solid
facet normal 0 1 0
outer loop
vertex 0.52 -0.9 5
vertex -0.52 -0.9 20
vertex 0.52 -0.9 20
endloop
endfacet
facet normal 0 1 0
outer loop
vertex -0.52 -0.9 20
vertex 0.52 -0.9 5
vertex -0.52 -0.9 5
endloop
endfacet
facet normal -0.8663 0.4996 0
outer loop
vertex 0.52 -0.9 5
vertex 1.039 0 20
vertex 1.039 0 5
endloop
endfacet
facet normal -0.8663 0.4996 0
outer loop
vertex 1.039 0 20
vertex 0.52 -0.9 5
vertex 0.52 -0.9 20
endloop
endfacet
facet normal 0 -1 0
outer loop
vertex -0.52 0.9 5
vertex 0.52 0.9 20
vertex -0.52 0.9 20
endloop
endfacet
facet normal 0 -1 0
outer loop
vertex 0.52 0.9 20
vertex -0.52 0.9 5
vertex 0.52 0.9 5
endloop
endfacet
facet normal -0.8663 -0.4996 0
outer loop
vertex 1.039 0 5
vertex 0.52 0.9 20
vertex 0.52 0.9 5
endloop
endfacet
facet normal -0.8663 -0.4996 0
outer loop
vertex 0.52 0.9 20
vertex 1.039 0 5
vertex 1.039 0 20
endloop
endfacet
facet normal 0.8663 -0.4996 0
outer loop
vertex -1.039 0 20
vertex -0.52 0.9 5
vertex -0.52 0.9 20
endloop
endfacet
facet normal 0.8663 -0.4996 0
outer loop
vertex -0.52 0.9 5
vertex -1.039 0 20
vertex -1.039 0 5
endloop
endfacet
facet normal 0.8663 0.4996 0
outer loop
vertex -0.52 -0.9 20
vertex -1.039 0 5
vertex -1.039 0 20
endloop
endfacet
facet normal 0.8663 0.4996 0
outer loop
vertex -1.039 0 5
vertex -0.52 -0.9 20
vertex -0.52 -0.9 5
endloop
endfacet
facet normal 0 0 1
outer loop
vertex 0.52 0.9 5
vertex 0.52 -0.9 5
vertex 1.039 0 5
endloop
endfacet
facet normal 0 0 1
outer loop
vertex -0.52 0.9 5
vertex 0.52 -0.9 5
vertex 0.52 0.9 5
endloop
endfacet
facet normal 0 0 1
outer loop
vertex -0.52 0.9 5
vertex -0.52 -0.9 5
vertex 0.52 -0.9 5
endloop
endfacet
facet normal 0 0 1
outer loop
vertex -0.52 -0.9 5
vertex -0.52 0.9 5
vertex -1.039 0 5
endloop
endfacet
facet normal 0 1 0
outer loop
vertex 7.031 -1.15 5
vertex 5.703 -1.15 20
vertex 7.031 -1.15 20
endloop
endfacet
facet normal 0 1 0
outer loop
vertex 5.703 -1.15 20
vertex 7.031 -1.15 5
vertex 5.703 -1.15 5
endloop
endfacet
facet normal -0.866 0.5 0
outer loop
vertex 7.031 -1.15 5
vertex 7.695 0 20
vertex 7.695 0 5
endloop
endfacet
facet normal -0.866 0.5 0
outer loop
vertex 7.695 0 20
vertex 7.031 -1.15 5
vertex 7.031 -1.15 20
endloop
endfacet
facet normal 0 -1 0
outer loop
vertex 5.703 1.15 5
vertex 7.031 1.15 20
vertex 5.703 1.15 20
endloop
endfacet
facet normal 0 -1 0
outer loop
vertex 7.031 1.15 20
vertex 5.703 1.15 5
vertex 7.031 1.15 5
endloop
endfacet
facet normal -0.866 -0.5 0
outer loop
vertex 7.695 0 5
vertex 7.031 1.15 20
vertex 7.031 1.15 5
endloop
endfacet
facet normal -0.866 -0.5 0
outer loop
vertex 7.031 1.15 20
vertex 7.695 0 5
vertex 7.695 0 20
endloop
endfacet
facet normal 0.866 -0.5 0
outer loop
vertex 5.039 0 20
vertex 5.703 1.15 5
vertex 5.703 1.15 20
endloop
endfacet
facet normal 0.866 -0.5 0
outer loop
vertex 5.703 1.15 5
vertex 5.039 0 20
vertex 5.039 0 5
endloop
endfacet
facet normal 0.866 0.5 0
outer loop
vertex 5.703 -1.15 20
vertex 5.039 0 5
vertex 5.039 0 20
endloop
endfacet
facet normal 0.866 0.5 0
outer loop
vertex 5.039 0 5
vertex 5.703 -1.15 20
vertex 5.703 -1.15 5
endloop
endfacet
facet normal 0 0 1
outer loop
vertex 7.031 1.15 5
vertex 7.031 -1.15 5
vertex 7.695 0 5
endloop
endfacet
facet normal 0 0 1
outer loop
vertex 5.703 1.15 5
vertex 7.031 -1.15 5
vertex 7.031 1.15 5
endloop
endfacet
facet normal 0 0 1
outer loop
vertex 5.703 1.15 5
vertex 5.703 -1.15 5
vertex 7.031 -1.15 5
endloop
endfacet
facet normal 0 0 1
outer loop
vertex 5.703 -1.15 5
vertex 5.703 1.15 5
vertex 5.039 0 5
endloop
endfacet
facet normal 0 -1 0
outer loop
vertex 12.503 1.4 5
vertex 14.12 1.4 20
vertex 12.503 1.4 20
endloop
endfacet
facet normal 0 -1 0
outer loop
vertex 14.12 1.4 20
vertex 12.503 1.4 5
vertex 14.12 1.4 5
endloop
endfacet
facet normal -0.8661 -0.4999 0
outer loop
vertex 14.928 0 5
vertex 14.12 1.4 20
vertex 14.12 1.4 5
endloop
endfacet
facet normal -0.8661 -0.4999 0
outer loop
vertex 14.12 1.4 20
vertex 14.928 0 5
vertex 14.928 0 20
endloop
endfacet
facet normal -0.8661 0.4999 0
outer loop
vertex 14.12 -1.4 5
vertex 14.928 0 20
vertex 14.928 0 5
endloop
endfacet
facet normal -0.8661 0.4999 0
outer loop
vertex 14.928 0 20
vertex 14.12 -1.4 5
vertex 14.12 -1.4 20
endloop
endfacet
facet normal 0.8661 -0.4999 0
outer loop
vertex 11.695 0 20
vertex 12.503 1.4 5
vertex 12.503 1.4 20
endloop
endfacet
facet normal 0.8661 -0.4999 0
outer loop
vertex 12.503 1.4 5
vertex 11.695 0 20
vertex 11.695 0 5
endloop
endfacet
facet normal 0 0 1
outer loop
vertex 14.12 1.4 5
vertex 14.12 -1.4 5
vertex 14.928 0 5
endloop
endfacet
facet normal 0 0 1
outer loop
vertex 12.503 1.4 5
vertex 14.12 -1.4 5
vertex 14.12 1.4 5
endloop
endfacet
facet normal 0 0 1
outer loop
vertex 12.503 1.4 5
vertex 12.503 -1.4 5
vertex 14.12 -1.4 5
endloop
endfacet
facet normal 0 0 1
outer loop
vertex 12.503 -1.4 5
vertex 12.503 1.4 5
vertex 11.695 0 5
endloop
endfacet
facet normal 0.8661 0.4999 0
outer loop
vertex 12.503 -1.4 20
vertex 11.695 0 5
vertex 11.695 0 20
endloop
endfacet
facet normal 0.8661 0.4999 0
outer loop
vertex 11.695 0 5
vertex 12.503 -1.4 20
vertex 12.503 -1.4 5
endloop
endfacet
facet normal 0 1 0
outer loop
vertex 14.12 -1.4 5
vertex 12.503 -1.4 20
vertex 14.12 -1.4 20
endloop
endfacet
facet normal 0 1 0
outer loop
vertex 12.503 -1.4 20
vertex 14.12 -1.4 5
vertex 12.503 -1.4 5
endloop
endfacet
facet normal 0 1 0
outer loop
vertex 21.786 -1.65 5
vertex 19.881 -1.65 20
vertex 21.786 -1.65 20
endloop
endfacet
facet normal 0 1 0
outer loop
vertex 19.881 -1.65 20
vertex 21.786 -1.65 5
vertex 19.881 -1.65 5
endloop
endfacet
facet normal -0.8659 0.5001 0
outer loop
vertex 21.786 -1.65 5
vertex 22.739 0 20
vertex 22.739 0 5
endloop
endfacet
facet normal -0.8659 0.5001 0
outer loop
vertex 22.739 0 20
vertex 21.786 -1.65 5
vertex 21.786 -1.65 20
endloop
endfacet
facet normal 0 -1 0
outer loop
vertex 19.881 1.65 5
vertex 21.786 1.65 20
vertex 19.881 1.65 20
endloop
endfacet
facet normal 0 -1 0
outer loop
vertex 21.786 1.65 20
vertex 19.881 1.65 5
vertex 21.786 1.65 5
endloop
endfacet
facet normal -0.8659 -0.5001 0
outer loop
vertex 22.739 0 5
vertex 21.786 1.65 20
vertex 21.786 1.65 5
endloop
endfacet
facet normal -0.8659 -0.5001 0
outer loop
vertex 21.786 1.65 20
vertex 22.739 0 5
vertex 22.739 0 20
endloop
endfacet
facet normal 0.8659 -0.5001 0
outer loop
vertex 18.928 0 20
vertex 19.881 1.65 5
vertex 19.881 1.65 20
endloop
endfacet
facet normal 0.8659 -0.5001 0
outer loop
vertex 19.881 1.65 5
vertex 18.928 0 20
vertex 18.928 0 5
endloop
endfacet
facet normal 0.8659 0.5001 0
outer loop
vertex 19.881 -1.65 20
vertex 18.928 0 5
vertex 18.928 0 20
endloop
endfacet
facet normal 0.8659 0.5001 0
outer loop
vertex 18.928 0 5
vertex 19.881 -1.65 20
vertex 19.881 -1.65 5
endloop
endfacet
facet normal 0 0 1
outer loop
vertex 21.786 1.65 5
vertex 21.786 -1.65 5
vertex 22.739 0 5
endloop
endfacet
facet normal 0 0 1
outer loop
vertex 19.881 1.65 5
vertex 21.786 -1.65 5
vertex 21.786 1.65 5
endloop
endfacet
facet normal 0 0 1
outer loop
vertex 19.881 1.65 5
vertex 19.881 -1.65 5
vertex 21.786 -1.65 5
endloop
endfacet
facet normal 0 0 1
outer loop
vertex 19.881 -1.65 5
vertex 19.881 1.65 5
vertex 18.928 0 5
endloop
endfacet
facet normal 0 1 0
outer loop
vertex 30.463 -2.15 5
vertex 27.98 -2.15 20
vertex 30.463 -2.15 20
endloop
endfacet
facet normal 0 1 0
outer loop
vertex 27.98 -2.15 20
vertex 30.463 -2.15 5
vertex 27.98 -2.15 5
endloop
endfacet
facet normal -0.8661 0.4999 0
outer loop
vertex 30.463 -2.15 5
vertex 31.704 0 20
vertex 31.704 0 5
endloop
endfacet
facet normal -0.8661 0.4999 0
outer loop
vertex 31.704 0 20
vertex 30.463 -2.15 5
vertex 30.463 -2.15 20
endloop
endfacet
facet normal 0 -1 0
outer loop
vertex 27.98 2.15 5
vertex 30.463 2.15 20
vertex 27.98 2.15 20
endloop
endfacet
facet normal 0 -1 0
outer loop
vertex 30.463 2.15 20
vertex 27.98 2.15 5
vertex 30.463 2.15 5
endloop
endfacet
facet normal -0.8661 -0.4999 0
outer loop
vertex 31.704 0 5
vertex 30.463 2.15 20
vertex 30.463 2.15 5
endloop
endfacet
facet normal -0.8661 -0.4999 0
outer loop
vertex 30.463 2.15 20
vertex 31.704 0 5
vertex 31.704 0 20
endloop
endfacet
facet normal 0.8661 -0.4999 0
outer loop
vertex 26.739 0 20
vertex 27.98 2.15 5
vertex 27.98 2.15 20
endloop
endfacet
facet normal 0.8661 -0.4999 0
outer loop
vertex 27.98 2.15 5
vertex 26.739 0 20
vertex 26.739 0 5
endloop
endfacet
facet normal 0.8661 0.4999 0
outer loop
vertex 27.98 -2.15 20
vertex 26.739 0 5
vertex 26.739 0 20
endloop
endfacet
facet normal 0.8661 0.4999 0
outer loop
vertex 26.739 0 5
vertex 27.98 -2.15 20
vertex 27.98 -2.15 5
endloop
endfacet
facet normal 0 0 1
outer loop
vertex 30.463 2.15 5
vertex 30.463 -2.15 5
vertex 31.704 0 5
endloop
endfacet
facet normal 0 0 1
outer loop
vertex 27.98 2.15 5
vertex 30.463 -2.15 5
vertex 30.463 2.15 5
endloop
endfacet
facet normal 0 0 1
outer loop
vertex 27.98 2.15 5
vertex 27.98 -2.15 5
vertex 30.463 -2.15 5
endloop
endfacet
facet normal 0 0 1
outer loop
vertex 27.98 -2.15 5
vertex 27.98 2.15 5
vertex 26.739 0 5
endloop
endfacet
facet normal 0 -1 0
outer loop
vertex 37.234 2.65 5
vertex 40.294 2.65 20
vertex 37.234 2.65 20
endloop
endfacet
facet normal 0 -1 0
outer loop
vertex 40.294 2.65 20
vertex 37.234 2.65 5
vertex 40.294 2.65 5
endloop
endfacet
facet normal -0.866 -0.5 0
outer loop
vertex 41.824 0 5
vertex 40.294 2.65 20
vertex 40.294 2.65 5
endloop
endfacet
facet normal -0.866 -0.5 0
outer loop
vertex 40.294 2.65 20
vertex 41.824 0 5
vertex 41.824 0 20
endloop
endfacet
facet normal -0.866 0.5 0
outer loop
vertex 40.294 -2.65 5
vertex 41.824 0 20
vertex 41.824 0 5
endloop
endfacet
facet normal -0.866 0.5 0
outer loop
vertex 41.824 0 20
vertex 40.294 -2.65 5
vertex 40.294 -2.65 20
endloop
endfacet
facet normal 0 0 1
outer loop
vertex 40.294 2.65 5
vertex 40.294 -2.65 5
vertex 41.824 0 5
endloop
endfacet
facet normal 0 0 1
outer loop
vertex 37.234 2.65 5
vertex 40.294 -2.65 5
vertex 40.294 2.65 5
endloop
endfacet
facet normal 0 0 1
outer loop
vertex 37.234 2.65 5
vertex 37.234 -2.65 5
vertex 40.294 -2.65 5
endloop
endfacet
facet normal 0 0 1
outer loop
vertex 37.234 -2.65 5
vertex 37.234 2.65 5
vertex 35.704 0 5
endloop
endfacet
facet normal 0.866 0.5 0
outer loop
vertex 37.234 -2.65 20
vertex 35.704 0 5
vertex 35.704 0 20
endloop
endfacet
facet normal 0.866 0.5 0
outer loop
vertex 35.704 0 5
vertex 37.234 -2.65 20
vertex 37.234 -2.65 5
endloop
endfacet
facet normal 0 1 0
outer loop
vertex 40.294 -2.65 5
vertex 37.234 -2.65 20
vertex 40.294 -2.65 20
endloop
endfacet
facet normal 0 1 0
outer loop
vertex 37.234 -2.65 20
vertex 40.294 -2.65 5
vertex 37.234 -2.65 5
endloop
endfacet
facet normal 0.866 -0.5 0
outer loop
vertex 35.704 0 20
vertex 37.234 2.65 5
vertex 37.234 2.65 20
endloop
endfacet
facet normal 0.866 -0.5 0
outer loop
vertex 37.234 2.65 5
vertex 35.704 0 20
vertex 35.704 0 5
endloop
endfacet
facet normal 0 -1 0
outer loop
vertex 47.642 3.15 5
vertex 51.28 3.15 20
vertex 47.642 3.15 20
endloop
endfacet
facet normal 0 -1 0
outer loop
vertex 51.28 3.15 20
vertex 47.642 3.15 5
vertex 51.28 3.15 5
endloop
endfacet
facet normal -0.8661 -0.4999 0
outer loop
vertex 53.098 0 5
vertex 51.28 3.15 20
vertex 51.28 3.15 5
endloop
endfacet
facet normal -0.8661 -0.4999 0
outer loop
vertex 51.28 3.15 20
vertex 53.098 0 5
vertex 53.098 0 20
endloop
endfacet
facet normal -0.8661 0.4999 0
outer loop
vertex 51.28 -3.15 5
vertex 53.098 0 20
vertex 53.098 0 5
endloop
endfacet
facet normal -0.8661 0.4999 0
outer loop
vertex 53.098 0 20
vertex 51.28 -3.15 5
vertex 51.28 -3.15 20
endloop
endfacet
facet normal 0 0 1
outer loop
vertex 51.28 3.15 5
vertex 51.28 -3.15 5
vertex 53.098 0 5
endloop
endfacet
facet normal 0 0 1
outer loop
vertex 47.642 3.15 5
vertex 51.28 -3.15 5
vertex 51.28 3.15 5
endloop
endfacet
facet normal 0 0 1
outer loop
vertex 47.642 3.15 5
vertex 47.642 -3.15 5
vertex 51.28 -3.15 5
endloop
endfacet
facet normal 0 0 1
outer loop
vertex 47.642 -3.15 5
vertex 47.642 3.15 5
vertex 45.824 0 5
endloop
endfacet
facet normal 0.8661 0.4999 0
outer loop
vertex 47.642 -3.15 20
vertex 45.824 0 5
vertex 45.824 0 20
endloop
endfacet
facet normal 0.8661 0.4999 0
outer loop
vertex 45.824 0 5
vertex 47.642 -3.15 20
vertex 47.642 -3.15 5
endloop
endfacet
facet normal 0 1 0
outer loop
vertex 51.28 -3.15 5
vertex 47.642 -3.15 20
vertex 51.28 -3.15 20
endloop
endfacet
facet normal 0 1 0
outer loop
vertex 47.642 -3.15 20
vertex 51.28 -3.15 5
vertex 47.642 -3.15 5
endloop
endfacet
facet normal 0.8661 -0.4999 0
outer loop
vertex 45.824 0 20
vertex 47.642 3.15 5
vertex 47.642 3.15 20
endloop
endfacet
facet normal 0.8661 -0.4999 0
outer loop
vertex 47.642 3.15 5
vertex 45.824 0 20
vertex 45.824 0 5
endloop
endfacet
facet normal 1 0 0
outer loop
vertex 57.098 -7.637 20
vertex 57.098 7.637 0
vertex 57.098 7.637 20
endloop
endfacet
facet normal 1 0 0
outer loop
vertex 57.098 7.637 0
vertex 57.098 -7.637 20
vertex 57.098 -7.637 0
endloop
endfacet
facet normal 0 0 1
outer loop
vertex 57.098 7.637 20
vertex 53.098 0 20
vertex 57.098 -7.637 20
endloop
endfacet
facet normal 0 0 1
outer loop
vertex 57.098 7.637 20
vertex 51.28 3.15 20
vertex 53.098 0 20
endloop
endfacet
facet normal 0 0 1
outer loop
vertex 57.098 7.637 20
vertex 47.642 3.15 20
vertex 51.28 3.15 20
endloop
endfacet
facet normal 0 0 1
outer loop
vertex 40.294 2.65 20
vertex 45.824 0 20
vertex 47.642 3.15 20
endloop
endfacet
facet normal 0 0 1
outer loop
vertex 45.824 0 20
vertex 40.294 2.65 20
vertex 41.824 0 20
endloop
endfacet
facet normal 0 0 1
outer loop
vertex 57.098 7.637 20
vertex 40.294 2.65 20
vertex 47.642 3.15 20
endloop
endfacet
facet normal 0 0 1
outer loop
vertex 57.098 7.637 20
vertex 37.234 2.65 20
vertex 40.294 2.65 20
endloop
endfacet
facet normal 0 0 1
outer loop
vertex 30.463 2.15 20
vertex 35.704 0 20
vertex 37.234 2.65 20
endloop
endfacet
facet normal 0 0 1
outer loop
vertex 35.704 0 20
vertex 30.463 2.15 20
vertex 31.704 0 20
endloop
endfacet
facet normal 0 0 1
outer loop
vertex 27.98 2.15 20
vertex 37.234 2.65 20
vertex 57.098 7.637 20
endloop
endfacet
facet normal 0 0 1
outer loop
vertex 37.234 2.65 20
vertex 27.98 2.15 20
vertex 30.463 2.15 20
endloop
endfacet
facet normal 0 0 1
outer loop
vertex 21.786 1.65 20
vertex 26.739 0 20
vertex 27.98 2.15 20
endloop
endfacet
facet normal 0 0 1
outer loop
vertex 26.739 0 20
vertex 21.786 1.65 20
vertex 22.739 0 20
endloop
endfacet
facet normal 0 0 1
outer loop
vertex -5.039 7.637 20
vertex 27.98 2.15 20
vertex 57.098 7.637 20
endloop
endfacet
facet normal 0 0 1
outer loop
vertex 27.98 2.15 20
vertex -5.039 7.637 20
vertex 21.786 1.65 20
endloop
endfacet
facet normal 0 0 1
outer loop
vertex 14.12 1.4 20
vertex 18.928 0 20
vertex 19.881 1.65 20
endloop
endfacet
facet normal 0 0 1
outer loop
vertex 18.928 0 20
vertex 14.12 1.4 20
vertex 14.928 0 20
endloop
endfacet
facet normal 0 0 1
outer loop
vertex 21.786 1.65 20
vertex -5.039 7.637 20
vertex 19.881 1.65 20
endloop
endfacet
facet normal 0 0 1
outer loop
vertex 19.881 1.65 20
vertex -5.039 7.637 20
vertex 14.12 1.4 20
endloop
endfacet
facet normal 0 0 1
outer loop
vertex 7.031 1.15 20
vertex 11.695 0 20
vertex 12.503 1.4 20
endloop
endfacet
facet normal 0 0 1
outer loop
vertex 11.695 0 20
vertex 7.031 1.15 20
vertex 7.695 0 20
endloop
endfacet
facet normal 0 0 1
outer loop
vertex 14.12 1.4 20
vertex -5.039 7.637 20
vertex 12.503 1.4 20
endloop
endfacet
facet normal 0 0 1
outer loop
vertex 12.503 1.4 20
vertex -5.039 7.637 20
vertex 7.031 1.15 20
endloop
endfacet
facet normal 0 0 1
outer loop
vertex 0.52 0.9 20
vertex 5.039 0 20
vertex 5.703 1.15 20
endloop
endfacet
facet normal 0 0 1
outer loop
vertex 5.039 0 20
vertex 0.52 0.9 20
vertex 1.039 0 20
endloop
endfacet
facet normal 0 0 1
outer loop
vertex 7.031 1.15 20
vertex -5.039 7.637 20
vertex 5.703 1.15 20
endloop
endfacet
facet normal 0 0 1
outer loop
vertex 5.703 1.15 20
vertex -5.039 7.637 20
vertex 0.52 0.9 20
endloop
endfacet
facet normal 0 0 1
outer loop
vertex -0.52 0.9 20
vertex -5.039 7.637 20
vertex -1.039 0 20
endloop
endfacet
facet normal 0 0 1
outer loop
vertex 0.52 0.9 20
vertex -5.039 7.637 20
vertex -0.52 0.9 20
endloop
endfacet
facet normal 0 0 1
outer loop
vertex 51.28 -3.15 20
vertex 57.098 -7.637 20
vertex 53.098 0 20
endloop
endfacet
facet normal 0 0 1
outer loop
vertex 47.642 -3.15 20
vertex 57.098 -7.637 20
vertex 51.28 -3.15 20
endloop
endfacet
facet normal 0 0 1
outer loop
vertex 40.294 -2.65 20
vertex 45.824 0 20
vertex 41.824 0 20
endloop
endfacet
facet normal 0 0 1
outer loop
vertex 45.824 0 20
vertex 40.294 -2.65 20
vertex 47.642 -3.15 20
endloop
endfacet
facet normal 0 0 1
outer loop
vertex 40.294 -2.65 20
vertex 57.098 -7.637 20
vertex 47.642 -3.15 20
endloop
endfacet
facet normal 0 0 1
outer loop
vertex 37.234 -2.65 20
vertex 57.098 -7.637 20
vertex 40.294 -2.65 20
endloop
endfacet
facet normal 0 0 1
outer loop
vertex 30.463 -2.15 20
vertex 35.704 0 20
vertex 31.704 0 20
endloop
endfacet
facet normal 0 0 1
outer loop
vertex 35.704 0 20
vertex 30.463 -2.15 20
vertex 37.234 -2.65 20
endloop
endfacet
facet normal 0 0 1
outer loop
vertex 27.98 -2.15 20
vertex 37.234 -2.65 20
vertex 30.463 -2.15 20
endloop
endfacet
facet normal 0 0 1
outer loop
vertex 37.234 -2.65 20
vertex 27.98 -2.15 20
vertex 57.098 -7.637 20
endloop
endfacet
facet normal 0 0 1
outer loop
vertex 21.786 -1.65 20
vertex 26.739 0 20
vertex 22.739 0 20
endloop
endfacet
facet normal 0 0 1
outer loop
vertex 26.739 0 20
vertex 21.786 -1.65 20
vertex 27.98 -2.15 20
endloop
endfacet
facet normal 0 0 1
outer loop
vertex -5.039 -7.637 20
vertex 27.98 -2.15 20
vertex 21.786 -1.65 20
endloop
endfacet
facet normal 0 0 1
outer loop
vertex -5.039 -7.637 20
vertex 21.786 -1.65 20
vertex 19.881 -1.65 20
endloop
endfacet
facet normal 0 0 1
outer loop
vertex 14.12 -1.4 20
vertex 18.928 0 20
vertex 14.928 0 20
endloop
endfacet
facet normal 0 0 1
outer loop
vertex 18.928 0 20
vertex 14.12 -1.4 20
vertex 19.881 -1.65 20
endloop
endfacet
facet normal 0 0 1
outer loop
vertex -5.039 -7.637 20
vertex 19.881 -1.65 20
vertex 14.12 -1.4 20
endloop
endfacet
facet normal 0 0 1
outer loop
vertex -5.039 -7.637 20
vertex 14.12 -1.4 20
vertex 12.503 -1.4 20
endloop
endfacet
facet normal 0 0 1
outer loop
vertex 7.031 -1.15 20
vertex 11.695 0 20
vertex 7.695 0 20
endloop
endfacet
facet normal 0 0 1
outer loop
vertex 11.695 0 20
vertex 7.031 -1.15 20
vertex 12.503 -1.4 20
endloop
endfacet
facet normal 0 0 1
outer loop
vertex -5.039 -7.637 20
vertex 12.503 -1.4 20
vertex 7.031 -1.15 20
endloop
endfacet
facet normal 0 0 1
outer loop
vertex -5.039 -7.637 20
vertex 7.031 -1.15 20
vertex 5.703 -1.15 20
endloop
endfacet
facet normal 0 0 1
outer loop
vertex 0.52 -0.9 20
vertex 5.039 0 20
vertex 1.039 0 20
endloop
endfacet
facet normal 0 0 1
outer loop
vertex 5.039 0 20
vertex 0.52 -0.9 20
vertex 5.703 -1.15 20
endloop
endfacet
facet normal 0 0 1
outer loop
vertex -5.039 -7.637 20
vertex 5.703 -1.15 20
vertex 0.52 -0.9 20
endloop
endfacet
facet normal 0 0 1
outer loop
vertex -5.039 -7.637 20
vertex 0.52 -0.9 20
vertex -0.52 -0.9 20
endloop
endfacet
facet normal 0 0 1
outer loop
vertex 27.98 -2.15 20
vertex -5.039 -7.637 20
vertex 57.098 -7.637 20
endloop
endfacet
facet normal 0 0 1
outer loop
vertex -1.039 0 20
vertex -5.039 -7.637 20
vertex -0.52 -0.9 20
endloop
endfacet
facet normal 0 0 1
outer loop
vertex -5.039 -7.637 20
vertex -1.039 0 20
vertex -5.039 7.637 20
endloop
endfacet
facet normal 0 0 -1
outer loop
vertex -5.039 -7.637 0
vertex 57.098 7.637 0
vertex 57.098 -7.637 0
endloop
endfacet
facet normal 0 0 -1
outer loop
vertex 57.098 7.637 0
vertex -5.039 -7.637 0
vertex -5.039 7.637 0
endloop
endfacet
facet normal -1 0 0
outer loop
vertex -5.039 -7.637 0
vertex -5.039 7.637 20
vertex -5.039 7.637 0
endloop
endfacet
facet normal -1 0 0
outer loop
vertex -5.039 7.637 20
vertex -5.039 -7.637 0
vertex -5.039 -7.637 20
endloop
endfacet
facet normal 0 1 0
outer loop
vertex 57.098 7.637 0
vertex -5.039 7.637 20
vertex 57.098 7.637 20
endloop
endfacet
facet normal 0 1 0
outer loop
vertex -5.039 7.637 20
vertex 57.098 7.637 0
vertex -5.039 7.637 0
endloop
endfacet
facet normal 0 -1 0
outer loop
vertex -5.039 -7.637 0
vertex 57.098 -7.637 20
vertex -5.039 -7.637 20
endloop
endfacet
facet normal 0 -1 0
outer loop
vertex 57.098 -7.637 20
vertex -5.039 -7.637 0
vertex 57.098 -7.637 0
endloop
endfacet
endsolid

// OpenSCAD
// Hex key holder: one hexagonal pocket per key size
sizes = [1.5, 2, 2.5, 3, 4, 5, 6];
spacing = 4;      // [2:10]
depth = 15;       // [5:40]
clearance = 0.3;  // [0:0.05:1]
base = 5;

function across_corners(f) = f / cos(30);
function offset_of(i) = i == 0 ? 0 : offset_of(i - 1) + across_corners(sizes[i - 1] + clearance) / 2 + spacing + across_corners(sizes[i] + clearance) / 2;

total = offset_of(len(sizes) - 1) + across_corners(sizes[len(sizes) - 1] + clearance) / 2 + spacing + across_corners(sizes[0] + clearance) / 2 + spacing;
width = across_corners(max(sizes) + clearance) + 2 * spacing;

difference() {
  translate([-spacing - across_corners(sizes[0] + clearance) / 2, -width / 2, 0]) cube([total, width, depth + base]);
  for (i = [0 : len(sizes) - 1])
    translate([offset_of(i), 0, base]) cylinder(d = across_corners(sizes[i] + clearance), h = depth + 1, $fn = 6);
}
